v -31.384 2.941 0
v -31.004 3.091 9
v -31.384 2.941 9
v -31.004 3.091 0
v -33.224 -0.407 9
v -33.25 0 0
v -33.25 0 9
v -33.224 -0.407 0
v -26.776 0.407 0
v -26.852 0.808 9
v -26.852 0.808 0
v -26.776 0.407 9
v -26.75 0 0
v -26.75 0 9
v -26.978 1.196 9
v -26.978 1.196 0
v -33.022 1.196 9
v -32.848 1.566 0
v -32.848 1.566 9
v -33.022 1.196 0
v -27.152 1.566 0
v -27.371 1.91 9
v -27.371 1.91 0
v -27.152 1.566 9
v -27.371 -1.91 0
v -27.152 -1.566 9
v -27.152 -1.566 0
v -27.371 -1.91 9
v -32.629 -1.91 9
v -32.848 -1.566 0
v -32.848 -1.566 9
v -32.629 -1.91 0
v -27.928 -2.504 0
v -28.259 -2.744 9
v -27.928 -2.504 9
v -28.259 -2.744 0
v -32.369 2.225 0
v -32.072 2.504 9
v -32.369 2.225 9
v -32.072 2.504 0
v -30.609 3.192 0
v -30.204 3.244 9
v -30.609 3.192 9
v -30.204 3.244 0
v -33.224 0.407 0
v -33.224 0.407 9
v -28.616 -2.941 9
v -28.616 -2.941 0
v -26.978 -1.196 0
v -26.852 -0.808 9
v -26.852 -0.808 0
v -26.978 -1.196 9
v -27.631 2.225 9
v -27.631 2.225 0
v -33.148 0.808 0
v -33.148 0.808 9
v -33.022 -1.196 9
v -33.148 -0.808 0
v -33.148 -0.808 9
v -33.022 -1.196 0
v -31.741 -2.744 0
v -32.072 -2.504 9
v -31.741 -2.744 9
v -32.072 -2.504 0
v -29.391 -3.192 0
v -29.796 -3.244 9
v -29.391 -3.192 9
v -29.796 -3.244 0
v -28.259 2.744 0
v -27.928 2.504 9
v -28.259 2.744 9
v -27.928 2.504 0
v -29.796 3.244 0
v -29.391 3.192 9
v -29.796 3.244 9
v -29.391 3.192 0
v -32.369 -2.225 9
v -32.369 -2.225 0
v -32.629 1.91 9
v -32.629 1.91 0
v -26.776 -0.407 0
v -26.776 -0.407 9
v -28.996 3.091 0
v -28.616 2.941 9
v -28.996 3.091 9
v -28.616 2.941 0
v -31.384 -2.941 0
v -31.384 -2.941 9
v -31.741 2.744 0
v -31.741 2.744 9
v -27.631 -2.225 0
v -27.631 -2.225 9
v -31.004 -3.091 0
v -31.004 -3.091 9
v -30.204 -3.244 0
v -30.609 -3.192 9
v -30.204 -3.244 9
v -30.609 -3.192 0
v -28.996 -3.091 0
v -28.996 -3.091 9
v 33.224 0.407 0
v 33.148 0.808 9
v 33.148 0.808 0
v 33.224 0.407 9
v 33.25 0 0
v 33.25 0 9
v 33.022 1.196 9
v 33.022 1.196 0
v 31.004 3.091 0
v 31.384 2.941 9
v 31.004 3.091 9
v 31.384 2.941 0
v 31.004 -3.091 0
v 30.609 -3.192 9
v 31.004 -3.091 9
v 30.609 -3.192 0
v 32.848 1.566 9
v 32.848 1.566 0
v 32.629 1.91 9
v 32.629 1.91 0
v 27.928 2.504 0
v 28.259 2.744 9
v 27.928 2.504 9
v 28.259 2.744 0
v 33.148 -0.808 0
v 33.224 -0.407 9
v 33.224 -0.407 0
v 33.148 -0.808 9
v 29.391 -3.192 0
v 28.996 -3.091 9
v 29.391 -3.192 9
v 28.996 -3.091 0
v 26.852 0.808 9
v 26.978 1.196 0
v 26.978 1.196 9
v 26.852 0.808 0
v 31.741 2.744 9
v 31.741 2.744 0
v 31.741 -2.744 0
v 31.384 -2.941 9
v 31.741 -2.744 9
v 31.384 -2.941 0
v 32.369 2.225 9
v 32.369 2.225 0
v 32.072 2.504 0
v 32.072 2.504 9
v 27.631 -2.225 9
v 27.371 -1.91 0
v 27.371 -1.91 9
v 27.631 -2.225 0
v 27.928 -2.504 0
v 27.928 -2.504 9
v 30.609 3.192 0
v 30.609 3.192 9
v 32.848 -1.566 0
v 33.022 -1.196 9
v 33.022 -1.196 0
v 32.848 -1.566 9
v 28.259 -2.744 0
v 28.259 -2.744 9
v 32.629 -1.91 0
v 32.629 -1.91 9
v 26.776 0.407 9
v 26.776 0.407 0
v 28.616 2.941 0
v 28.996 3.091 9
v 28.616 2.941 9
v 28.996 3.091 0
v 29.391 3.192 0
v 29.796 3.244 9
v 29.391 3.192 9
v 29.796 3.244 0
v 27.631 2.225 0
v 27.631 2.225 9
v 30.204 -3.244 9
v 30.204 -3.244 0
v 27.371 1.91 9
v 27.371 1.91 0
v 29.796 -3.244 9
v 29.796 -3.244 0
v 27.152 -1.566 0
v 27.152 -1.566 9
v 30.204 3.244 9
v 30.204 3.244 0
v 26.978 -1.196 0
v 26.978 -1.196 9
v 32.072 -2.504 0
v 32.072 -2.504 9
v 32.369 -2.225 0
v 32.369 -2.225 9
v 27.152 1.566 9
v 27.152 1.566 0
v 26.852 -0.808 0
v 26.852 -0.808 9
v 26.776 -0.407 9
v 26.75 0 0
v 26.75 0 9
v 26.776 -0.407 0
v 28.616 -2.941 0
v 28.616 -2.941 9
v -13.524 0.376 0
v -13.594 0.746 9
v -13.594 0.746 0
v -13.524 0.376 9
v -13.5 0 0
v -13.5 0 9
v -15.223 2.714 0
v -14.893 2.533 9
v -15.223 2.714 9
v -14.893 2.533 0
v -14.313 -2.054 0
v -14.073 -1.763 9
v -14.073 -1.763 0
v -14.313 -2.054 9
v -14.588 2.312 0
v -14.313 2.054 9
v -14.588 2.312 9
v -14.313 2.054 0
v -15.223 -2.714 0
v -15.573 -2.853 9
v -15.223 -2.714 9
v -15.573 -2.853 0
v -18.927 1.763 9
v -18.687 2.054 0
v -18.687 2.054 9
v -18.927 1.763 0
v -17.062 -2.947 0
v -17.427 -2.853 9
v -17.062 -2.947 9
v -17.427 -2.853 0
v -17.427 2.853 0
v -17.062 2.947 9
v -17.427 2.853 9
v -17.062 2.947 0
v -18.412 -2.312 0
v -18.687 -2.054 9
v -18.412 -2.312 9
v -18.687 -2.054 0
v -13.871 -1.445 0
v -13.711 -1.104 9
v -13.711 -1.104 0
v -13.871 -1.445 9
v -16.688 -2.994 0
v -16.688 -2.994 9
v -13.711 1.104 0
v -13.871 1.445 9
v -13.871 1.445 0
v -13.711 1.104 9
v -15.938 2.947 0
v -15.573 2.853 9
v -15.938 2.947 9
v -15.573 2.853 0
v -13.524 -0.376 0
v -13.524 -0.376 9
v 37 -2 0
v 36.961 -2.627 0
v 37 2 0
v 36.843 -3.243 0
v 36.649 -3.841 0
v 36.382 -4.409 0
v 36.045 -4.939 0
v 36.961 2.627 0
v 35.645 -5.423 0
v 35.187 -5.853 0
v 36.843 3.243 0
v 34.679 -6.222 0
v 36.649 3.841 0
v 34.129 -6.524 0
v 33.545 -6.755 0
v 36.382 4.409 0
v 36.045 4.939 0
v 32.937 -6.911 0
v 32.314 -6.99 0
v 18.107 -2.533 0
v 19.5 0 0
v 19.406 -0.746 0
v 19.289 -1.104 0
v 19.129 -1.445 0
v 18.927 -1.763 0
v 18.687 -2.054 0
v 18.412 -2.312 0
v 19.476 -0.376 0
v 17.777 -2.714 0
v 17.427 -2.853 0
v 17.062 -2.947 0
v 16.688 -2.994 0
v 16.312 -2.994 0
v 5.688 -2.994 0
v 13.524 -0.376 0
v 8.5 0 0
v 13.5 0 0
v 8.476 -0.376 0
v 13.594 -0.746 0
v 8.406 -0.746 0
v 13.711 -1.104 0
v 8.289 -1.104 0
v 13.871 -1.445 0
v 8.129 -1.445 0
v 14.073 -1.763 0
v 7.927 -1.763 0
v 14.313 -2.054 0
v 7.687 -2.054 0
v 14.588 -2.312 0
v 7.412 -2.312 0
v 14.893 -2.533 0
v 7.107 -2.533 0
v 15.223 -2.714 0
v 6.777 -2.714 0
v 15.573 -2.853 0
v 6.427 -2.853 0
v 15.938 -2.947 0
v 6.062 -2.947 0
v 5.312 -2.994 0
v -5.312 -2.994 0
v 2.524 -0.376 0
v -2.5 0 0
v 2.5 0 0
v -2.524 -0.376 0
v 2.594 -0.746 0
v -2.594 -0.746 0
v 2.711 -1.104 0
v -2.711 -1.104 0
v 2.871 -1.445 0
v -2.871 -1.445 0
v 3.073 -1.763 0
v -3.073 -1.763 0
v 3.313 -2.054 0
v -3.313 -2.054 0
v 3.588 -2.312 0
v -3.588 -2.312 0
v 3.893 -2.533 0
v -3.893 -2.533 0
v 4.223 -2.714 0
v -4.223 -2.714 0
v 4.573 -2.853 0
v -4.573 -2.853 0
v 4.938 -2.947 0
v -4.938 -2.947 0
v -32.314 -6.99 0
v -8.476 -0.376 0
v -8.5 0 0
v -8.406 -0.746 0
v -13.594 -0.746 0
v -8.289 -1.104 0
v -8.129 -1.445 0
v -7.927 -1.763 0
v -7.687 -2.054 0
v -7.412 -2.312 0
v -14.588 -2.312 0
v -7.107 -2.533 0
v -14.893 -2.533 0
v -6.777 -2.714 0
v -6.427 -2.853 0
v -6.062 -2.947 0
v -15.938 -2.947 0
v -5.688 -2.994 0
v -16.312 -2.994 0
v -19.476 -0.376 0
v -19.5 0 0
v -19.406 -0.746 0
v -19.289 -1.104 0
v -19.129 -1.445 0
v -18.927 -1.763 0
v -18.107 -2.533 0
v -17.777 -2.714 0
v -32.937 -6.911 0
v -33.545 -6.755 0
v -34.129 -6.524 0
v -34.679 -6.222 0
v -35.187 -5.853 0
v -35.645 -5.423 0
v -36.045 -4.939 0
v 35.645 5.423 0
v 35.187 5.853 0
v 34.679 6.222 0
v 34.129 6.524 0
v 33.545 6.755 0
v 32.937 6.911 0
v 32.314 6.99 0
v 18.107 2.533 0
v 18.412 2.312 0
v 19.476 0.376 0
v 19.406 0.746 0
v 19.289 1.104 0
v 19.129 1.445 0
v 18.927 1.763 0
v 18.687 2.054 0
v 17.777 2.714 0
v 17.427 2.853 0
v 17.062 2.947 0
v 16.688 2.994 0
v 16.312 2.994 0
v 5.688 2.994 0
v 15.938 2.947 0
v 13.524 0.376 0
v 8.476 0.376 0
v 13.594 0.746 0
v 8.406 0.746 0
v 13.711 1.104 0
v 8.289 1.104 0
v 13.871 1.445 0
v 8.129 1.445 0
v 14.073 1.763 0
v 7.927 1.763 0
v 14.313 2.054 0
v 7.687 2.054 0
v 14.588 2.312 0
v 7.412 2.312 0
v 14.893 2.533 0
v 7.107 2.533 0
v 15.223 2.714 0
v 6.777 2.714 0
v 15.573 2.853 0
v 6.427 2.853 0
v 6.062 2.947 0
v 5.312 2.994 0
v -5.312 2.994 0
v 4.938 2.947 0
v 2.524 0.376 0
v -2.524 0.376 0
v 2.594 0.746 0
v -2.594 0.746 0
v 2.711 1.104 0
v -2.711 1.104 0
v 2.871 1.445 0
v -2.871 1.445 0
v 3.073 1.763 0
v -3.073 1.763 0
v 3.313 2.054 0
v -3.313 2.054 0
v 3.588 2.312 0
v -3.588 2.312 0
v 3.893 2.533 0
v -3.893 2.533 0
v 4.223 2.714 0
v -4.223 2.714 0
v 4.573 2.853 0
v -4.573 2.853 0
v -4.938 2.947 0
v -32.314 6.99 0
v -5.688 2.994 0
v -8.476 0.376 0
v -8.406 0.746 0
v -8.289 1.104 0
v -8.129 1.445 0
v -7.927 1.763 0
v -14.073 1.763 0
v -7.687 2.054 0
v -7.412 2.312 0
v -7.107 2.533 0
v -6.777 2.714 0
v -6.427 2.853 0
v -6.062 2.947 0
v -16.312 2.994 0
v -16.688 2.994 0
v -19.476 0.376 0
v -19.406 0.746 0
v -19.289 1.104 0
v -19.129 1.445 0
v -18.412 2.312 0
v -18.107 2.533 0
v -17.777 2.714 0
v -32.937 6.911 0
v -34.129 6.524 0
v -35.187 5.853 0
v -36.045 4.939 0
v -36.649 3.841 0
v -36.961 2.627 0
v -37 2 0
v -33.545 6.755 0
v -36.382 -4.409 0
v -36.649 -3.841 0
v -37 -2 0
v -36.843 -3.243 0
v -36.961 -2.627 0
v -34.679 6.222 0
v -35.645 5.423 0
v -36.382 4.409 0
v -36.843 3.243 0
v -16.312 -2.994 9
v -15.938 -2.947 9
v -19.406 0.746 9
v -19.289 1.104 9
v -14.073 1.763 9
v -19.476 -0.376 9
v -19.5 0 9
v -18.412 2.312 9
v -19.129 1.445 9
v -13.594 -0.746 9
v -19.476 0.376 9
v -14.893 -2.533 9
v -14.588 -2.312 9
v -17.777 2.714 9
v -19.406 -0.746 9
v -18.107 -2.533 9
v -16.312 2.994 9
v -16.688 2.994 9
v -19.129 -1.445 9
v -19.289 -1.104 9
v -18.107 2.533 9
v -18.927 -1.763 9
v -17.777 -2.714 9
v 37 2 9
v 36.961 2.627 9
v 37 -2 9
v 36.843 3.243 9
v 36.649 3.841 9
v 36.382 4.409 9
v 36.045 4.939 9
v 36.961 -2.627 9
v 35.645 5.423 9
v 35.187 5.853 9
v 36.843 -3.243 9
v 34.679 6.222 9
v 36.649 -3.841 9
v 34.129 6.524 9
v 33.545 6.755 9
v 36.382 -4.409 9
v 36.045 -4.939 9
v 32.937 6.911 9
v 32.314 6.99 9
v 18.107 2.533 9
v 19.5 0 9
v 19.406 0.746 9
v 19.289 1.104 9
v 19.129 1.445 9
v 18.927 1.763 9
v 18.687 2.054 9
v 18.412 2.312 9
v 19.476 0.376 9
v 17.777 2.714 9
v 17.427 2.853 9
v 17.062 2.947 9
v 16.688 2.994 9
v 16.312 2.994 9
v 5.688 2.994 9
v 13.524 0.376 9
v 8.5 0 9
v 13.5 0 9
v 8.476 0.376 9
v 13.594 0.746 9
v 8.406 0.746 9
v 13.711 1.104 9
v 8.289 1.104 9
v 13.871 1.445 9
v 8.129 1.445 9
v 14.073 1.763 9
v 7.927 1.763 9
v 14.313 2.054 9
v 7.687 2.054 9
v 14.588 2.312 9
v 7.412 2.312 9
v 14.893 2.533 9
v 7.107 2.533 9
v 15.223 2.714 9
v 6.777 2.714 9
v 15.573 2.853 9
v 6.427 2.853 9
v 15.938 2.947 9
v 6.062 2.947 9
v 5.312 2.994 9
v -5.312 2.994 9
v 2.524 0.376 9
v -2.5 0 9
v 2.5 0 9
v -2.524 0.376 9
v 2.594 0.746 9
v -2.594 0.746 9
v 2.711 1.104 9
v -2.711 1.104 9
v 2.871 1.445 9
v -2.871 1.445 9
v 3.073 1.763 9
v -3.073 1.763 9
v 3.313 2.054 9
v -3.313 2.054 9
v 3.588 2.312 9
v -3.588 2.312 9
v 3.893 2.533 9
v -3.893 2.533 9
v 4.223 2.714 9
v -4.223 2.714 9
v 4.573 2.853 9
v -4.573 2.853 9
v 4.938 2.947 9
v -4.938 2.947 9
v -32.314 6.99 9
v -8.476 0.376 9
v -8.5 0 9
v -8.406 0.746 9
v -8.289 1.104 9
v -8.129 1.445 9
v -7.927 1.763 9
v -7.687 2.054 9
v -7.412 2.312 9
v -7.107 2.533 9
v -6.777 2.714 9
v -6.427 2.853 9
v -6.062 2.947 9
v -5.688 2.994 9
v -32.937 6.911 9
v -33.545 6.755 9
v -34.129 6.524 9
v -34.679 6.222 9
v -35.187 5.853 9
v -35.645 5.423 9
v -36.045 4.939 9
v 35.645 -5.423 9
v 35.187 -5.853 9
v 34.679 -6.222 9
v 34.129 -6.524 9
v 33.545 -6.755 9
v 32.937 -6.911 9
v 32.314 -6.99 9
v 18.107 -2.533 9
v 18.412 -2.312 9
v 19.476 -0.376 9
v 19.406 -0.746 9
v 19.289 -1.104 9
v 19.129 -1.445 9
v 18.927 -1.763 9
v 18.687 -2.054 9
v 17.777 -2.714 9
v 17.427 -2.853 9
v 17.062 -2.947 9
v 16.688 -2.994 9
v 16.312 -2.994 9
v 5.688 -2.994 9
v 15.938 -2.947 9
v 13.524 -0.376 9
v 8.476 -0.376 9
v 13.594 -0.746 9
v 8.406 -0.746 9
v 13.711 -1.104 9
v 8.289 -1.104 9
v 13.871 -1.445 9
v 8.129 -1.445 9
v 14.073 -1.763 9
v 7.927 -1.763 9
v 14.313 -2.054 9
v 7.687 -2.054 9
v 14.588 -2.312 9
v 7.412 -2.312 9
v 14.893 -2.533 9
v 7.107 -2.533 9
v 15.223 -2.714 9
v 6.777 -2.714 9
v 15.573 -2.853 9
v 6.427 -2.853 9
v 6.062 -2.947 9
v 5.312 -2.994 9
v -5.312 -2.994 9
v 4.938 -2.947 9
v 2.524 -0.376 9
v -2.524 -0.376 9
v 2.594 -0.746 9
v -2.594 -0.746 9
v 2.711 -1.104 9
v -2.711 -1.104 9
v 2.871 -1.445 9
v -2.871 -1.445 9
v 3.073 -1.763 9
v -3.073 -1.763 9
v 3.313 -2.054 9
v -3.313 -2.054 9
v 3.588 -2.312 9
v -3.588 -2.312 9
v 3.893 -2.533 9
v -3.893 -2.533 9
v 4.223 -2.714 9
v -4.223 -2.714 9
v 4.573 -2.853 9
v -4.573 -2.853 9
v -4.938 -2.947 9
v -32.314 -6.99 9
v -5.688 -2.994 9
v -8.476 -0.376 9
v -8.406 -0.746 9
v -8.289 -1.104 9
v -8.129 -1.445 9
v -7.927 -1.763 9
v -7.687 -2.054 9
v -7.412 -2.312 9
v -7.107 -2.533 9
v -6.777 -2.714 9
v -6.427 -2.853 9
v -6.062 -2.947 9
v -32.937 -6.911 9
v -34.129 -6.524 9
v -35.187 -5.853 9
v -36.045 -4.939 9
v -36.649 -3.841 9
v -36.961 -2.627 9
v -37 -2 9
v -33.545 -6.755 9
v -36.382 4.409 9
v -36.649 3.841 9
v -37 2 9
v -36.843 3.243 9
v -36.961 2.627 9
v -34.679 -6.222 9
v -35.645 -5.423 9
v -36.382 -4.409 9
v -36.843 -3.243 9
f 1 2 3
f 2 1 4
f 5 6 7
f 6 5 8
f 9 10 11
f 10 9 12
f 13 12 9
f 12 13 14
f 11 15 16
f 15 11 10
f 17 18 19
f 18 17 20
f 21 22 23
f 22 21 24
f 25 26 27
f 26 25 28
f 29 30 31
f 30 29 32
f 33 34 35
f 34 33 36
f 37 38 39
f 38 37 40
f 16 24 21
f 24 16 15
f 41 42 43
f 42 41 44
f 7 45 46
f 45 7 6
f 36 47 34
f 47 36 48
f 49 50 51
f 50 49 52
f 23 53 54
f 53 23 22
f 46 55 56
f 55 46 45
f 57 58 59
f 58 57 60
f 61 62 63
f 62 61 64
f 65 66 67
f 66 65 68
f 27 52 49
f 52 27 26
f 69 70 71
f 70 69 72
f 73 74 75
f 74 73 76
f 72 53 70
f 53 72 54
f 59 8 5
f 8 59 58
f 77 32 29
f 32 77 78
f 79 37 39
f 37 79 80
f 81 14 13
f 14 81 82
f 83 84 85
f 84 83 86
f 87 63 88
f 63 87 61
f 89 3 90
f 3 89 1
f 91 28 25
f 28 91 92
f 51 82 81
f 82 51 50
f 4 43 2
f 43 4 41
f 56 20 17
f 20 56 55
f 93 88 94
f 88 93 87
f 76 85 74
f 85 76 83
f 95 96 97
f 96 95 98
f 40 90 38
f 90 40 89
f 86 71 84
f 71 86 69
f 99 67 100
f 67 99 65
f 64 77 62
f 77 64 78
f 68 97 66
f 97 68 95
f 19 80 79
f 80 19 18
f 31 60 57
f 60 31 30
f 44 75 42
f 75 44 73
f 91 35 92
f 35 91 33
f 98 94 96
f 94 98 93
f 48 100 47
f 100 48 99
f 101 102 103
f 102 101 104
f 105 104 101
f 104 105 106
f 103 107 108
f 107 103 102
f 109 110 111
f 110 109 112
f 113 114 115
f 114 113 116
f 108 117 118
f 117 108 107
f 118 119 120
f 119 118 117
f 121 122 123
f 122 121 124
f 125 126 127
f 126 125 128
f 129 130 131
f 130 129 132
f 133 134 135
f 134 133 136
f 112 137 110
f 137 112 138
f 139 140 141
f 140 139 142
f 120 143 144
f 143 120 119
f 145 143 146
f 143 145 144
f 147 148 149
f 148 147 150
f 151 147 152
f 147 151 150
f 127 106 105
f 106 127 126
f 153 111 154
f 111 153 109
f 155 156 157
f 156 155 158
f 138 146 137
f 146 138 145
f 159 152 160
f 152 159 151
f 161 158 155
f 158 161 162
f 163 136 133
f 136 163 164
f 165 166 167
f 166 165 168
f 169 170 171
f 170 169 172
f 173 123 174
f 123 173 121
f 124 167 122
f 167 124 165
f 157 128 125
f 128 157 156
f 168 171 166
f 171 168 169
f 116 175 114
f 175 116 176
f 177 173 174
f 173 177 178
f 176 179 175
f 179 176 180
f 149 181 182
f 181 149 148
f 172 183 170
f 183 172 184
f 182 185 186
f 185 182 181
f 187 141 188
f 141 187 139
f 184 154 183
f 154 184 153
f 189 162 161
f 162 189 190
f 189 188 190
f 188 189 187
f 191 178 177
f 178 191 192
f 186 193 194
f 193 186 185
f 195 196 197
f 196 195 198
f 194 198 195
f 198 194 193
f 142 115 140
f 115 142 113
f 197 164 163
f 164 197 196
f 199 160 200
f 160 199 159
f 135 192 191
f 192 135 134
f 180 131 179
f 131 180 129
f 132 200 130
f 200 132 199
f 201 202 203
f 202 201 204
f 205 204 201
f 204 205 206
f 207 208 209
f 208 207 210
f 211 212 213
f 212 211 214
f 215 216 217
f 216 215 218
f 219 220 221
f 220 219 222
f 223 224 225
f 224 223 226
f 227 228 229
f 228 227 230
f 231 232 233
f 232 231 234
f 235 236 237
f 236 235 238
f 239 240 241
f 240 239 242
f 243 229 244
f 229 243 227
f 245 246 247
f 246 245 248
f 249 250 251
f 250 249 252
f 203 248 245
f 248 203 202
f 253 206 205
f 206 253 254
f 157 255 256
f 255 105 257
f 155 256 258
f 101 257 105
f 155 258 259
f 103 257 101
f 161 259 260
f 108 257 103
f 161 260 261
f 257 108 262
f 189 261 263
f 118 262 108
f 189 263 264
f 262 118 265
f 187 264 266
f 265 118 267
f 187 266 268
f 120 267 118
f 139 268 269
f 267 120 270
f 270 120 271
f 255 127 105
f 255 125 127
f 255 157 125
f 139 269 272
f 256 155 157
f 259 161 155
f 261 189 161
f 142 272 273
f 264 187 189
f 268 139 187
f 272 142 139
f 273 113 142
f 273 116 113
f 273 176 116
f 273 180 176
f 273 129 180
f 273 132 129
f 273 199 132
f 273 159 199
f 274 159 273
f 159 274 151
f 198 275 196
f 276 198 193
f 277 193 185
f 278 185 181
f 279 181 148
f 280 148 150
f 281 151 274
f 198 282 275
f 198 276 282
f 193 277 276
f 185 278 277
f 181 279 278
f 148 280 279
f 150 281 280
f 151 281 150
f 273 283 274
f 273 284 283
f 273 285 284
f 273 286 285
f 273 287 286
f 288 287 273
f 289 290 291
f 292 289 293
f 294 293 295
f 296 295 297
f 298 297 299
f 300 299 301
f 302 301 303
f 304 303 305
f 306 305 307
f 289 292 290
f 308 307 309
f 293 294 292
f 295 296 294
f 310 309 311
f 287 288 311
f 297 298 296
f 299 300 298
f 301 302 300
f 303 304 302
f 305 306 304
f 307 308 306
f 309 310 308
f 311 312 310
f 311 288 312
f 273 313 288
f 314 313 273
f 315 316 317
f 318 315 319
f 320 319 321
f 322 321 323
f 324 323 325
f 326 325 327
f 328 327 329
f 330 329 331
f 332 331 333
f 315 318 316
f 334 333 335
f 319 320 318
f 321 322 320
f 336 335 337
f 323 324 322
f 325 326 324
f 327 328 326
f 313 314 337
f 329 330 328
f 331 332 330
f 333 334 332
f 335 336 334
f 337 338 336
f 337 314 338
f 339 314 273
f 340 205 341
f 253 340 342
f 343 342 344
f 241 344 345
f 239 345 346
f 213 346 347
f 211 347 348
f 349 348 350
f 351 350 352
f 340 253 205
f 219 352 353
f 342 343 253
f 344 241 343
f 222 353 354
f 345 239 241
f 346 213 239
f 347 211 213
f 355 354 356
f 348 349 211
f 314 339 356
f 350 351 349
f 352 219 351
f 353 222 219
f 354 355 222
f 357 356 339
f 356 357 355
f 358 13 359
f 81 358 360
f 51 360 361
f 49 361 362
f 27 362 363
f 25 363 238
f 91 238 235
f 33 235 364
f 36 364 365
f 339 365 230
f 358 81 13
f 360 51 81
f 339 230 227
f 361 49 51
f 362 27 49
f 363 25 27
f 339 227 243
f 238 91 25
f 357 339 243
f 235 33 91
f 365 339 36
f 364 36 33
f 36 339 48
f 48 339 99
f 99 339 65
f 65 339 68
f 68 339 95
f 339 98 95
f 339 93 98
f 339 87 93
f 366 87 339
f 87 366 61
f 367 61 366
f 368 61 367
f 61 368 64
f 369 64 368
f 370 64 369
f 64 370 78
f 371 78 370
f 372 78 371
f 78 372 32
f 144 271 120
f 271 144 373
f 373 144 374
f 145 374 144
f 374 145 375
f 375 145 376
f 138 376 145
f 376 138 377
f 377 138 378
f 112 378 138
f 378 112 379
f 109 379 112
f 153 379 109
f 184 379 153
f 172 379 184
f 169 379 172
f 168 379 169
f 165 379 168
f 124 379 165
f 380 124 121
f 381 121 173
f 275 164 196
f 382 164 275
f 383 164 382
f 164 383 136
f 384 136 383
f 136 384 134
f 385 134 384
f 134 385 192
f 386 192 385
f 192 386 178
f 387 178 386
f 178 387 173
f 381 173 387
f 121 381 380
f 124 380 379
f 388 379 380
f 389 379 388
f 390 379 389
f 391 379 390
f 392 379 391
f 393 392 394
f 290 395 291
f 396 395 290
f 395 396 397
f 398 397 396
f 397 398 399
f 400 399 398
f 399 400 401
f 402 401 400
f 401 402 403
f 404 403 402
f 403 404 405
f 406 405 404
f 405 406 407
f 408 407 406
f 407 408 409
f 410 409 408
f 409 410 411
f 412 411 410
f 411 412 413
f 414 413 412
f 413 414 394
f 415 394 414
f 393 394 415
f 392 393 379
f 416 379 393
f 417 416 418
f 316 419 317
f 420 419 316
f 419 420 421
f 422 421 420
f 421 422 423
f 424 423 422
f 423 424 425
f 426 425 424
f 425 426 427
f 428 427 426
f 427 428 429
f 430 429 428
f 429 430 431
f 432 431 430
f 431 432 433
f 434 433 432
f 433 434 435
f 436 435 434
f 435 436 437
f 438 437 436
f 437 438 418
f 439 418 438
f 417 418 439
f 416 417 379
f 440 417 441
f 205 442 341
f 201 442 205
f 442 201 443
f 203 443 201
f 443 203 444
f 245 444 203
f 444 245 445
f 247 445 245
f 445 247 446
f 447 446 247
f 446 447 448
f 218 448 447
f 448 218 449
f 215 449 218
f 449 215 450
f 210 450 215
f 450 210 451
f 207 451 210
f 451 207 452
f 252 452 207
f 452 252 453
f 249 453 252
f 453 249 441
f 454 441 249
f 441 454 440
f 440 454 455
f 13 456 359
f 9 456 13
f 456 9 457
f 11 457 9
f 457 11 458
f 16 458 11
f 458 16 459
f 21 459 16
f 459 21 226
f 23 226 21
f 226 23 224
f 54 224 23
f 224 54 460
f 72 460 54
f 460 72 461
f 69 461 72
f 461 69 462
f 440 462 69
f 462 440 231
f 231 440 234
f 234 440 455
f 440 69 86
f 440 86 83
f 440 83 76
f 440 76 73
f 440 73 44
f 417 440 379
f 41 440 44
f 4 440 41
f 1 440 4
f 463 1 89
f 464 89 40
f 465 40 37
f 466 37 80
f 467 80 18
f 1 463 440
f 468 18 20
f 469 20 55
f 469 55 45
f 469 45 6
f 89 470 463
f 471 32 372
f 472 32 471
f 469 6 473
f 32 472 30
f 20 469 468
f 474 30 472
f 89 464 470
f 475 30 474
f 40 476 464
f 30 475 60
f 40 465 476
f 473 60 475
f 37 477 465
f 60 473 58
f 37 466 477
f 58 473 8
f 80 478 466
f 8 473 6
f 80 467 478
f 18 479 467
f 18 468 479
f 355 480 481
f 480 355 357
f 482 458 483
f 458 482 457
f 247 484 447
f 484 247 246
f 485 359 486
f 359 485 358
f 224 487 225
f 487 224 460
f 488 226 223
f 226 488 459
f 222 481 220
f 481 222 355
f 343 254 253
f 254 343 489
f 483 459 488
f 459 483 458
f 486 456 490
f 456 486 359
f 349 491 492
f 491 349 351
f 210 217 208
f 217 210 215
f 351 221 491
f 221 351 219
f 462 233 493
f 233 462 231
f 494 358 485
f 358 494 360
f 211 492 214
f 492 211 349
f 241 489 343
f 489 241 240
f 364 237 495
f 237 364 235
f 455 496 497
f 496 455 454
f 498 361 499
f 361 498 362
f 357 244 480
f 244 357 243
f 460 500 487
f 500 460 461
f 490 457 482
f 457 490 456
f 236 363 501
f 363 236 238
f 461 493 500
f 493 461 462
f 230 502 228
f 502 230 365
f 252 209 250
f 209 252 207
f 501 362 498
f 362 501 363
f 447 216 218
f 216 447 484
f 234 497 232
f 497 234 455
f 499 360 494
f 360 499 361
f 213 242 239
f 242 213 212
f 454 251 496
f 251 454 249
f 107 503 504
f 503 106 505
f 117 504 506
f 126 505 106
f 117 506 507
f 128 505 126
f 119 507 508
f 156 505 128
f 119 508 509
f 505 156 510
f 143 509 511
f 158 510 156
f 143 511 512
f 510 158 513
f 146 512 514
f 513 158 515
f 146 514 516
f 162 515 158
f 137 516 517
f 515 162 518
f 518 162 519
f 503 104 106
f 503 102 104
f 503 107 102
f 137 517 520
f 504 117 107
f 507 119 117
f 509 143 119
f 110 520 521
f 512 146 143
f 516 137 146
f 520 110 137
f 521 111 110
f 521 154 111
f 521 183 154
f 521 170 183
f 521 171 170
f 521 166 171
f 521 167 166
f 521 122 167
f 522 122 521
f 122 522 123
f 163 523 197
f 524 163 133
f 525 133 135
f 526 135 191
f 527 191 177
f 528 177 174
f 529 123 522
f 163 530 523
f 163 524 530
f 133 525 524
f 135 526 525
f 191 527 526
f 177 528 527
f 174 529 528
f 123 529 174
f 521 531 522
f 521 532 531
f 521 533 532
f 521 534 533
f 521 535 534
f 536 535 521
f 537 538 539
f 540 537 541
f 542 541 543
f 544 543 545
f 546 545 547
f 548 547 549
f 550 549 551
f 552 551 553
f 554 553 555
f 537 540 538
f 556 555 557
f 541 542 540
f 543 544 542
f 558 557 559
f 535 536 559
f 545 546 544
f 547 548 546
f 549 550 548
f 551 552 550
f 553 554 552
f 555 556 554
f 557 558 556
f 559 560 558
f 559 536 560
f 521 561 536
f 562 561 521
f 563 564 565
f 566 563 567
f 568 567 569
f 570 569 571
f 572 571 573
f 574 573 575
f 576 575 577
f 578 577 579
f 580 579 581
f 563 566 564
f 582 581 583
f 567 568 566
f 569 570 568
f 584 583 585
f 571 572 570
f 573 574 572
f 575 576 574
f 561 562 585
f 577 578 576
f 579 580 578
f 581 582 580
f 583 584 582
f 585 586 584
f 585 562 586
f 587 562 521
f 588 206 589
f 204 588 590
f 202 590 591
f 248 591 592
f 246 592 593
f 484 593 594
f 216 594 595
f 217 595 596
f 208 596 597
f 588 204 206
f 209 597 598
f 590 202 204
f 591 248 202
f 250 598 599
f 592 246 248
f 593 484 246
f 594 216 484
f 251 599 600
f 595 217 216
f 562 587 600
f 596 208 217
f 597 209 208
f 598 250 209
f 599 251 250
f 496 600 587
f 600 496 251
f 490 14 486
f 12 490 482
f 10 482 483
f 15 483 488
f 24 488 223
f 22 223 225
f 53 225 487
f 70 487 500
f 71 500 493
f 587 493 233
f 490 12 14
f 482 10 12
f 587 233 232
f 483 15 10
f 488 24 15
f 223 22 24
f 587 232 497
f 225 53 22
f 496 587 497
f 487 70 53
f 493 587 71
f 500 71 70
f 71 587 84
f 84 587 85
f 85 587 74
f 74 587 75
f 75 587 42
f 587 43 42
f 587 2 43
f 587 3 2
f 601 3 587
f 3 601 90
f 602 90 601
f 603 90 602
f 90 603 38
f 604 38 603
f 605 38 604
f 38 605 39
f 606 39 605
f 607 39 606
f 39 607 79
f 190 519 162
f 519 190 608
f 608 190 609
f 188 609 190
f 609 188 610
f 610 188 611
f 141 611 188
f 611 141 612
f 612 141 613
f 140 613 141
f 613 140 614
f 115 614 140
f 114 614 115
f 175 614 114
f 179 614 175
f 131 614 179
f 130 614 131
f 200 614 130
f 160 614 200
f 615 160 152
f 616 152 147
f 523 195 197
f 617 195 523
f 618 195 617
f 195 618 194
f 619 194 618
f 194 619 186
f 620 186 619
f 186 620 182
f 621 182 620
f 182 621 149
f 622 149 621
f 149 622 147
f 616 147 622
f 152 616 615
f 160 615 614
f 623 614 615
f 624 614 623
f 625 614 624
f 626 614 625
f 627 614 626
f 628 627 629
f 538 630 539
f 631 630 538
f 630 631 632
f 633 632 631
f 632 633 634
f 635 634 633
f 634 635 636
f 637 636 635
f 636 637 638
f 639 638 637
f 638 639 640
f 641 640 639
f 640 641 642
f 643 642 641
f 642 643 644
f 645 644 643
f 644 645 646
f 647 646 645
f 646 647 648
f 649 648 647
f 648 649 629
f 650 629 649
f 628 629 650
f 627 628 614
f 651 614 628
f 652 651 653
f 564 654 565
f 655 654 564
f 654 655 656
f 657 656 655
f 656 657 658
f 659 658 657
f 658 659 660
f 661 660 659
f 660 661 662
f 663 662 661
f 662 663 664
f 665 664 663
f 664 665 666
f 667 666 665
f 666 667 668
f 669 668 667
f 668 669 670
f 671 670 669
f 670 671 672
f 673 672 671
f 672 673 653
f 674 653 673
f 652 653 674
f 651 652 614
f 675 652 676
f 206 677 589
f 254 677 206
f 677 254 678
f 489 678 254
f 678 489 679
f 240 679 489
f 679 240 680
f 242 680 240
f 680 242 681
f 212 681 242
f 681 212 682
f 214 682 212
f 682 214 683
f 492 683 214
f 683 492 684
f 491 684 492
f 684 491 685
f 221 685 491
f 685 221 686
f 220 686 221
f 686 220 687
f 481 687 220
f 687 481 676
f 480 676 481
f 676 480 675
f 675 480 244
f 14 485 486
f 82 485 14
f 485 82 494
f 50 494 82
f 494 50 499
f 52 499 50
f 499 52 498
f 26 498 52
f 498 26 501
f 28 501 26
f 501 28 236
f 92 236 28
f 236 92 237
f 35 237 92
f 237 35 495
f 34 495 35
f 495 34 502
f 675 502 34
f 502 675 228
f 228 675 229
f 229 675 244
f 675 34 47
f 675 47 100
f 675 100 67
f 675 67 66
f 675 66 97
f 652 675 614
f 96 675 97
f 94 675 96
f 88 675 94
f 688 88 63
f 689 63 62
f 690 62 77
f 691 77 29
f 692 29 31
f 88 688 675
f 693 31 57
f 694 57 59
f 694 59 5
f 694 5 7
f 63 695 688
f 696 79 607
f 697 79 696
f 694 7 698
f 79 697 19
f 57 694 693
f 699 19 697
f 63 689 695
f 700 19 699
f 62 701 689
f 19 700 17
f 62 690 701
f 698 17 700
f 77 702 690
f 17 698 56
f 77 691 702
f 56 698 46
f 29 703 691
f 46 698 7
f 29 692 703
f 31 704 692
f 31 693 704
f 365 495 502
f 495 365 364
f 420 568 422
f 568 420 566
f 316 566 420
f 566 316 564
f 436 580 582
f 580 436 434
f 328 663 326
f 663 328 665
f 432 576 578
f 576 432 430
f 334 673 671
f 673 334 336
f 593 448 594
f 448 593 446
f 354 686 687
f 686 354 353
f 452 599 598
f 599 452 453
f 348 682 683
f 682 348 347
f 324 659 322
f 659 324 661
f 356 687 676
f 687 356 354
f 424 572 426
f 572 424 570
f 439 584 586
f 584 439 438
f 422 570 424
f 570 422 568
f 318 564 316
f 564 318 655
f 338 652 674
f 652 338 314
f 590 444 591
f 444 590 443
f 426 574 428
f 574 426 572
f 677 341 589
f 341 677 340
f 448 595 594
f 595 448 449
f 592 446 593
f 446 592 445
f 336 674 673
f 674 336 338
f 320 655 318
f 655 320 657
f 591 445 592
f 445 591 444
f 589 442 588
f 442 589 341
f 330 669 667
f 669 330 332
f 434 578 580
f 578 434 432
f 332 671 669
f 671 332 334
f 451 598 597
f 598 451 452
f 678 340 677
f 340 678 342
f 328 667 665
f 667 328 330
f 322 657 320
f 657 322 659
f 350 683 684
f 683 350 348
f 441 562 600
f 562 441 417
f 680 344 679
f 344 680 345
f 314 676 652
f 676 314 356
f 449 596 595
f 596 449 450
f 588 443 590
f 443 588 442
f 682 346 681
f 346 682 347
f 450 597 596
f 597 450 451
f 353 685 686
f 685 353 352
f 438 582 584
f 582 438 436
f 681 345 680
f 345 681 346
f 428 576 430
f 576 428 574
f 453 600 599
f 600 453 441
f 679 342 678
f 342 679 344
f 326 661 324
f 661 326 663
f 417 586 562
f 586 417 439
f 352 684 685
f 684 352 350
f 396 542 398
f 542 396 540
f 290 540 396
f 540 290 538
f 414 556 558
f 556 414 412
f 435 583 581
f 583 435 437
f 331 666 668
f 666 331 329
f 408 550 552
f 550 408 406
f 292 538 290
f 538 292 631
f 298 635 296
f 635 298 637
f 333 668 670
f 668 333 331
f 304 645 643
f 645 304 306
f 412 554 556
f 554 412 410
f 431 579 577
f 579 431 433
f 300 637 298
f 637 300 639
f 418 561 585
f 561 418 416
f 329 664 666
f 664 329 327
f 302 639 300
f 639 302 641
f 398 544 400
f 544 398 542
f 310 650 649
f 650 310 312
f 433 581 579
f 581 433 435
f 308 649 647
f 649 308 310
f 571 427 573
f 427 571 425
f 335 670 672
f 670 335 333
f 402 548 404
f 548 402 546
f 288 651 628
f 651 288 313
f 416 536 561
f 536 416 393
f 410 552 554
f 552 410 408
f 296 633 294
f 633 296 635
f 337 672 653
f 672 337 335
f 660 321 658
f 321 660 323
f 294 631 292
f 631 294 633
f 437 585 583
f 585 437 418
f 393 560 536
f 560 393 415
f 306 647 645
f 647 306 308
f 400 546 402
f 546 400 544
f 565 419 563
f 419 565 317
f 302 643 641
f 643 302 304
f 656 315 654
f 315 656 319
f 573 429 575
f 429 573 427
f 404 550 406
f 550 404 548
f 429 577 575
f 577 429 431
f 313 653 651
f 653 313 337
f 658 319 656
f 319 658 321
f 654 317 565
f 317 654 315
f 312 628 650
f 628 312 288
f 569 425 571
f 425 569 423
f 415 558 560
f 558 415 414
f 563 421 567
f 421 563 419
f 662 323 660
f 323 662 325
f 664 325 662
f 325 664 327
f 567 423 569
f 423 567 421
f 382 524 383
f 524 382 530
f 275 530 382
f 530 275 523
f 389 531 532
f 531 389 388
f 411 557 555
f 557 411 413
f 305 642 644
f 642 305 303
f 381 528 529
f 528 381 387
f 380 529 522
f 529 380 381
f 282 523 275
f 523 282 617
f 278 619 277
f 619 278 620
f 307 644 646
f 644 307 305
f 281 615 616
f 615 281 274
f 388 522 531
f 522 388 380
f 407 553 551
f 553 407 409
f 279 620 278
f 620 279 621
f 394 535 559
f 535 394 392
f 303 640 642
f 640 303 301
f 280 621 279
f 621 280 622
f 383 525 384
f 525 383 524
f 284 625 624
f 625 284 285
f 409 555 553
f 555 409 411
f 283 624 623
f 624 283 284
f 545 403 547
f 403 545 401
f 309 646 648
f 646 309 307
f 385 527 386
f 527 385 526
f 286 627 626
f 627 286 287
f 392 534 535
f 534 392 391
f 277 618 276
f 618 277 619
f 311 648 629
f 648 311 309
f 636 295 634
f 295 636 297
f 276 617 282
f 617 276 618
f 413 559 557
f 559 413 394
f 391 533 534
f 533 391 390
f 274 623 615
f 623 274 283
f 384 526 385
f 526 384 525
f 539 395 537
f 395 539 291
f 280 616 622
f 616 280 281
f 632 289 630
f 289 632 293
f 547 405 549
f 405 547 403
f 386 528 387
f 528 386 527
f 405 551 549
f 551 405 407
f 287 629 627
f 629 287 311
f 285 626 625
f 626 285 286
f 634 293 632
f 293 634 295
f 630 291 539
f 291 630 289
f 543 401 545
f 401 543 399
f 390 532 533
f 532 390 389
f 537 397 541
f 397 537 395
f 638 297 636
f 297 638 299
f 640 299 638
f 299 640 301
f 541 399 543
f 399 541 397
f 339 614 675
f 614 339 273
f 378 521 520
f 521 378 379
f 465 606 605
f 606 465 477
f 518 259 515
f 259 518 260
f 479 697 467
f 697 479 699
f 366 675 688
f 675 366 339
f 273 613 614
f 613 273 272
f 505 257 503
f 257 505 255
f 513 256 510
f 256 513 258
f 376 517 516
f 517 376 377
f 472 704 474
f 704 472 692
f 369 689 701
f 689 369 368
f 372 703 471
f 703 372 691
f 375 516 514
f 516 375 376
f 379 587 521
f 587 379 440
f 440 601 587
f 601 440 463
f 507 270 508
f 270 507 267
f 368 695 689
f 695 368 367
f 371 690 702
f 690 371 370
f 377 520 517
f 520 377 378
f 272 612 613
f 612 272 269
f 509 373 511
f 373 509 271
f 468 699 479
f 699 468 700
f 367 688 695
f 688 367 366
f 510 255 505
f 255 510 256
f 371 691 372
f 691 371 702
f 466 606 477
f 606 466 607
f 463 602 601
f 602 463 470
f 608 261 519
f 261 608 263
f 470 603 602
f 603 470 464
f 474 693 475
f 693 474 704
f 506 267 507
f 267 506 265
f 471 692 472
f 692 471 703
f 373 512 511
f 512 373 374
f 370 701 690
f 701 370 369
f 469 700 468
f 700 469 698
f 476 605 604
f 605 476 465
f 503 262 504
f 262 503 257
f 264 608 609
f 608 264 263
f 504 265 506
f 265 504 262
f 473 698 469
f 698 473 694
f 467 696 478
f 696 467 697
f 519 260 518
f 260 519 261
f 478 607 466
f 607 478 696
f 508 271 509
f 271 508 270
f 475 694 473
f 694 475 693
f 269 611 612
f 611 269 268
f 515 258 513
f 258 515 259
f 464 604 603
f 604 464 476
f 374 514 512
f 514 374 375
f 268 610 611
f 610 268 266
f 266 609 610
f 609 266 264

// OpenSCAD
$fn = 50;


difference() {
	union() {
		hull() {
			translate(v = [-32.0000000000, 2.0000000000, 0]) {
				cylinder(h = 9, r = 5);
			}
			translate(v = [32.0000000000, 2.0000000000, 0]) {
				cylinder(h = 9, r = 5);
			}
			translate(v = [-32.0000000000, -2.0000000000, 0]) {
				cylinder(h = 9, r = 5);
			}
			translate(v = [32.0000000000, -2.0000000000, 0]) {
				cylinder(h = 9, r = 5);
			}
		}
	}
	union() {
		#translate(v = [-30.0000000000, 0.0000000000, 0]) {
			cylinder(h = 9, r = 3.2500000000);
		}
		#translate(v = [30.0000000000, 0.0000000000, 0]) {
			cylinder(h = 9, r = 3.2500000000);
		}
		#translate(v = [-30.0000000000, 0.0000000000, -100.0000000000]) {
			cylinder(h = 200, r = 3.2500000000);
		}
		#translate(v = [-30.0000000000, 0.0000000000, -100.0000000000]) {
			cylinder(h = 200, r = 3.2500000000);
		}
		#translate(v = [30.0000000000, 0.0000000000, -100.0000000000]) {
			cylinder(h = 200, r = 3.2500000000);
		}
		#translate(v = [30.0000000000, 0.0000000000, -100.0000000000]) {
			cylinder(h = 200, r = 3.2500000000);
		}
		#translate(v = [-30.0000000000, 0.0000000000, 0]) {
			cylinder(h = 9, r = 1.8000000000);
		}
		#translate(v = [30.0000000000, 0.0000000000, 0]) {
			cylinder(h = 9, r = 1.8000000000);
		}
		#translate(v = [-30.0000000000, 0.0000000000, 0]) {
			cylinder(h = 9, r = 1.8000000000);
		}
		#translate(v = [30.0000000000, 0.0000000000, 0]) {
			cylinder(h = 9, r = 1.8000000000);
		}
		#translate(v = [-30.0000000000, 0.0000000000, 0]) {
			cylinder(h = 9, r = 1.8000000000);
		}
		#translate(v = [30.0000000000, 0.0000000000, 0]) {
			cylinder(h = 9, r = 1.8000000000);
		}
		#translate(v = [-16.5000000000, 0, 0]) {
			cylinder(h = 9, r = 3.0000000000);
		}
		#translate(v = [-5.5000000000, 0, 0]) {
			cylinder(h = 9, r = 3.0000000000);
		}
		#translate(v = [5.5000000000, 0, 0]) {
			cylinder(h = 9, r = 3.0000000000);
		}
		#translate(v = [16.5000000000, 0, 0]) {
			cylinder(h = 9, r = 3.0000000000);
		}
	}
}
